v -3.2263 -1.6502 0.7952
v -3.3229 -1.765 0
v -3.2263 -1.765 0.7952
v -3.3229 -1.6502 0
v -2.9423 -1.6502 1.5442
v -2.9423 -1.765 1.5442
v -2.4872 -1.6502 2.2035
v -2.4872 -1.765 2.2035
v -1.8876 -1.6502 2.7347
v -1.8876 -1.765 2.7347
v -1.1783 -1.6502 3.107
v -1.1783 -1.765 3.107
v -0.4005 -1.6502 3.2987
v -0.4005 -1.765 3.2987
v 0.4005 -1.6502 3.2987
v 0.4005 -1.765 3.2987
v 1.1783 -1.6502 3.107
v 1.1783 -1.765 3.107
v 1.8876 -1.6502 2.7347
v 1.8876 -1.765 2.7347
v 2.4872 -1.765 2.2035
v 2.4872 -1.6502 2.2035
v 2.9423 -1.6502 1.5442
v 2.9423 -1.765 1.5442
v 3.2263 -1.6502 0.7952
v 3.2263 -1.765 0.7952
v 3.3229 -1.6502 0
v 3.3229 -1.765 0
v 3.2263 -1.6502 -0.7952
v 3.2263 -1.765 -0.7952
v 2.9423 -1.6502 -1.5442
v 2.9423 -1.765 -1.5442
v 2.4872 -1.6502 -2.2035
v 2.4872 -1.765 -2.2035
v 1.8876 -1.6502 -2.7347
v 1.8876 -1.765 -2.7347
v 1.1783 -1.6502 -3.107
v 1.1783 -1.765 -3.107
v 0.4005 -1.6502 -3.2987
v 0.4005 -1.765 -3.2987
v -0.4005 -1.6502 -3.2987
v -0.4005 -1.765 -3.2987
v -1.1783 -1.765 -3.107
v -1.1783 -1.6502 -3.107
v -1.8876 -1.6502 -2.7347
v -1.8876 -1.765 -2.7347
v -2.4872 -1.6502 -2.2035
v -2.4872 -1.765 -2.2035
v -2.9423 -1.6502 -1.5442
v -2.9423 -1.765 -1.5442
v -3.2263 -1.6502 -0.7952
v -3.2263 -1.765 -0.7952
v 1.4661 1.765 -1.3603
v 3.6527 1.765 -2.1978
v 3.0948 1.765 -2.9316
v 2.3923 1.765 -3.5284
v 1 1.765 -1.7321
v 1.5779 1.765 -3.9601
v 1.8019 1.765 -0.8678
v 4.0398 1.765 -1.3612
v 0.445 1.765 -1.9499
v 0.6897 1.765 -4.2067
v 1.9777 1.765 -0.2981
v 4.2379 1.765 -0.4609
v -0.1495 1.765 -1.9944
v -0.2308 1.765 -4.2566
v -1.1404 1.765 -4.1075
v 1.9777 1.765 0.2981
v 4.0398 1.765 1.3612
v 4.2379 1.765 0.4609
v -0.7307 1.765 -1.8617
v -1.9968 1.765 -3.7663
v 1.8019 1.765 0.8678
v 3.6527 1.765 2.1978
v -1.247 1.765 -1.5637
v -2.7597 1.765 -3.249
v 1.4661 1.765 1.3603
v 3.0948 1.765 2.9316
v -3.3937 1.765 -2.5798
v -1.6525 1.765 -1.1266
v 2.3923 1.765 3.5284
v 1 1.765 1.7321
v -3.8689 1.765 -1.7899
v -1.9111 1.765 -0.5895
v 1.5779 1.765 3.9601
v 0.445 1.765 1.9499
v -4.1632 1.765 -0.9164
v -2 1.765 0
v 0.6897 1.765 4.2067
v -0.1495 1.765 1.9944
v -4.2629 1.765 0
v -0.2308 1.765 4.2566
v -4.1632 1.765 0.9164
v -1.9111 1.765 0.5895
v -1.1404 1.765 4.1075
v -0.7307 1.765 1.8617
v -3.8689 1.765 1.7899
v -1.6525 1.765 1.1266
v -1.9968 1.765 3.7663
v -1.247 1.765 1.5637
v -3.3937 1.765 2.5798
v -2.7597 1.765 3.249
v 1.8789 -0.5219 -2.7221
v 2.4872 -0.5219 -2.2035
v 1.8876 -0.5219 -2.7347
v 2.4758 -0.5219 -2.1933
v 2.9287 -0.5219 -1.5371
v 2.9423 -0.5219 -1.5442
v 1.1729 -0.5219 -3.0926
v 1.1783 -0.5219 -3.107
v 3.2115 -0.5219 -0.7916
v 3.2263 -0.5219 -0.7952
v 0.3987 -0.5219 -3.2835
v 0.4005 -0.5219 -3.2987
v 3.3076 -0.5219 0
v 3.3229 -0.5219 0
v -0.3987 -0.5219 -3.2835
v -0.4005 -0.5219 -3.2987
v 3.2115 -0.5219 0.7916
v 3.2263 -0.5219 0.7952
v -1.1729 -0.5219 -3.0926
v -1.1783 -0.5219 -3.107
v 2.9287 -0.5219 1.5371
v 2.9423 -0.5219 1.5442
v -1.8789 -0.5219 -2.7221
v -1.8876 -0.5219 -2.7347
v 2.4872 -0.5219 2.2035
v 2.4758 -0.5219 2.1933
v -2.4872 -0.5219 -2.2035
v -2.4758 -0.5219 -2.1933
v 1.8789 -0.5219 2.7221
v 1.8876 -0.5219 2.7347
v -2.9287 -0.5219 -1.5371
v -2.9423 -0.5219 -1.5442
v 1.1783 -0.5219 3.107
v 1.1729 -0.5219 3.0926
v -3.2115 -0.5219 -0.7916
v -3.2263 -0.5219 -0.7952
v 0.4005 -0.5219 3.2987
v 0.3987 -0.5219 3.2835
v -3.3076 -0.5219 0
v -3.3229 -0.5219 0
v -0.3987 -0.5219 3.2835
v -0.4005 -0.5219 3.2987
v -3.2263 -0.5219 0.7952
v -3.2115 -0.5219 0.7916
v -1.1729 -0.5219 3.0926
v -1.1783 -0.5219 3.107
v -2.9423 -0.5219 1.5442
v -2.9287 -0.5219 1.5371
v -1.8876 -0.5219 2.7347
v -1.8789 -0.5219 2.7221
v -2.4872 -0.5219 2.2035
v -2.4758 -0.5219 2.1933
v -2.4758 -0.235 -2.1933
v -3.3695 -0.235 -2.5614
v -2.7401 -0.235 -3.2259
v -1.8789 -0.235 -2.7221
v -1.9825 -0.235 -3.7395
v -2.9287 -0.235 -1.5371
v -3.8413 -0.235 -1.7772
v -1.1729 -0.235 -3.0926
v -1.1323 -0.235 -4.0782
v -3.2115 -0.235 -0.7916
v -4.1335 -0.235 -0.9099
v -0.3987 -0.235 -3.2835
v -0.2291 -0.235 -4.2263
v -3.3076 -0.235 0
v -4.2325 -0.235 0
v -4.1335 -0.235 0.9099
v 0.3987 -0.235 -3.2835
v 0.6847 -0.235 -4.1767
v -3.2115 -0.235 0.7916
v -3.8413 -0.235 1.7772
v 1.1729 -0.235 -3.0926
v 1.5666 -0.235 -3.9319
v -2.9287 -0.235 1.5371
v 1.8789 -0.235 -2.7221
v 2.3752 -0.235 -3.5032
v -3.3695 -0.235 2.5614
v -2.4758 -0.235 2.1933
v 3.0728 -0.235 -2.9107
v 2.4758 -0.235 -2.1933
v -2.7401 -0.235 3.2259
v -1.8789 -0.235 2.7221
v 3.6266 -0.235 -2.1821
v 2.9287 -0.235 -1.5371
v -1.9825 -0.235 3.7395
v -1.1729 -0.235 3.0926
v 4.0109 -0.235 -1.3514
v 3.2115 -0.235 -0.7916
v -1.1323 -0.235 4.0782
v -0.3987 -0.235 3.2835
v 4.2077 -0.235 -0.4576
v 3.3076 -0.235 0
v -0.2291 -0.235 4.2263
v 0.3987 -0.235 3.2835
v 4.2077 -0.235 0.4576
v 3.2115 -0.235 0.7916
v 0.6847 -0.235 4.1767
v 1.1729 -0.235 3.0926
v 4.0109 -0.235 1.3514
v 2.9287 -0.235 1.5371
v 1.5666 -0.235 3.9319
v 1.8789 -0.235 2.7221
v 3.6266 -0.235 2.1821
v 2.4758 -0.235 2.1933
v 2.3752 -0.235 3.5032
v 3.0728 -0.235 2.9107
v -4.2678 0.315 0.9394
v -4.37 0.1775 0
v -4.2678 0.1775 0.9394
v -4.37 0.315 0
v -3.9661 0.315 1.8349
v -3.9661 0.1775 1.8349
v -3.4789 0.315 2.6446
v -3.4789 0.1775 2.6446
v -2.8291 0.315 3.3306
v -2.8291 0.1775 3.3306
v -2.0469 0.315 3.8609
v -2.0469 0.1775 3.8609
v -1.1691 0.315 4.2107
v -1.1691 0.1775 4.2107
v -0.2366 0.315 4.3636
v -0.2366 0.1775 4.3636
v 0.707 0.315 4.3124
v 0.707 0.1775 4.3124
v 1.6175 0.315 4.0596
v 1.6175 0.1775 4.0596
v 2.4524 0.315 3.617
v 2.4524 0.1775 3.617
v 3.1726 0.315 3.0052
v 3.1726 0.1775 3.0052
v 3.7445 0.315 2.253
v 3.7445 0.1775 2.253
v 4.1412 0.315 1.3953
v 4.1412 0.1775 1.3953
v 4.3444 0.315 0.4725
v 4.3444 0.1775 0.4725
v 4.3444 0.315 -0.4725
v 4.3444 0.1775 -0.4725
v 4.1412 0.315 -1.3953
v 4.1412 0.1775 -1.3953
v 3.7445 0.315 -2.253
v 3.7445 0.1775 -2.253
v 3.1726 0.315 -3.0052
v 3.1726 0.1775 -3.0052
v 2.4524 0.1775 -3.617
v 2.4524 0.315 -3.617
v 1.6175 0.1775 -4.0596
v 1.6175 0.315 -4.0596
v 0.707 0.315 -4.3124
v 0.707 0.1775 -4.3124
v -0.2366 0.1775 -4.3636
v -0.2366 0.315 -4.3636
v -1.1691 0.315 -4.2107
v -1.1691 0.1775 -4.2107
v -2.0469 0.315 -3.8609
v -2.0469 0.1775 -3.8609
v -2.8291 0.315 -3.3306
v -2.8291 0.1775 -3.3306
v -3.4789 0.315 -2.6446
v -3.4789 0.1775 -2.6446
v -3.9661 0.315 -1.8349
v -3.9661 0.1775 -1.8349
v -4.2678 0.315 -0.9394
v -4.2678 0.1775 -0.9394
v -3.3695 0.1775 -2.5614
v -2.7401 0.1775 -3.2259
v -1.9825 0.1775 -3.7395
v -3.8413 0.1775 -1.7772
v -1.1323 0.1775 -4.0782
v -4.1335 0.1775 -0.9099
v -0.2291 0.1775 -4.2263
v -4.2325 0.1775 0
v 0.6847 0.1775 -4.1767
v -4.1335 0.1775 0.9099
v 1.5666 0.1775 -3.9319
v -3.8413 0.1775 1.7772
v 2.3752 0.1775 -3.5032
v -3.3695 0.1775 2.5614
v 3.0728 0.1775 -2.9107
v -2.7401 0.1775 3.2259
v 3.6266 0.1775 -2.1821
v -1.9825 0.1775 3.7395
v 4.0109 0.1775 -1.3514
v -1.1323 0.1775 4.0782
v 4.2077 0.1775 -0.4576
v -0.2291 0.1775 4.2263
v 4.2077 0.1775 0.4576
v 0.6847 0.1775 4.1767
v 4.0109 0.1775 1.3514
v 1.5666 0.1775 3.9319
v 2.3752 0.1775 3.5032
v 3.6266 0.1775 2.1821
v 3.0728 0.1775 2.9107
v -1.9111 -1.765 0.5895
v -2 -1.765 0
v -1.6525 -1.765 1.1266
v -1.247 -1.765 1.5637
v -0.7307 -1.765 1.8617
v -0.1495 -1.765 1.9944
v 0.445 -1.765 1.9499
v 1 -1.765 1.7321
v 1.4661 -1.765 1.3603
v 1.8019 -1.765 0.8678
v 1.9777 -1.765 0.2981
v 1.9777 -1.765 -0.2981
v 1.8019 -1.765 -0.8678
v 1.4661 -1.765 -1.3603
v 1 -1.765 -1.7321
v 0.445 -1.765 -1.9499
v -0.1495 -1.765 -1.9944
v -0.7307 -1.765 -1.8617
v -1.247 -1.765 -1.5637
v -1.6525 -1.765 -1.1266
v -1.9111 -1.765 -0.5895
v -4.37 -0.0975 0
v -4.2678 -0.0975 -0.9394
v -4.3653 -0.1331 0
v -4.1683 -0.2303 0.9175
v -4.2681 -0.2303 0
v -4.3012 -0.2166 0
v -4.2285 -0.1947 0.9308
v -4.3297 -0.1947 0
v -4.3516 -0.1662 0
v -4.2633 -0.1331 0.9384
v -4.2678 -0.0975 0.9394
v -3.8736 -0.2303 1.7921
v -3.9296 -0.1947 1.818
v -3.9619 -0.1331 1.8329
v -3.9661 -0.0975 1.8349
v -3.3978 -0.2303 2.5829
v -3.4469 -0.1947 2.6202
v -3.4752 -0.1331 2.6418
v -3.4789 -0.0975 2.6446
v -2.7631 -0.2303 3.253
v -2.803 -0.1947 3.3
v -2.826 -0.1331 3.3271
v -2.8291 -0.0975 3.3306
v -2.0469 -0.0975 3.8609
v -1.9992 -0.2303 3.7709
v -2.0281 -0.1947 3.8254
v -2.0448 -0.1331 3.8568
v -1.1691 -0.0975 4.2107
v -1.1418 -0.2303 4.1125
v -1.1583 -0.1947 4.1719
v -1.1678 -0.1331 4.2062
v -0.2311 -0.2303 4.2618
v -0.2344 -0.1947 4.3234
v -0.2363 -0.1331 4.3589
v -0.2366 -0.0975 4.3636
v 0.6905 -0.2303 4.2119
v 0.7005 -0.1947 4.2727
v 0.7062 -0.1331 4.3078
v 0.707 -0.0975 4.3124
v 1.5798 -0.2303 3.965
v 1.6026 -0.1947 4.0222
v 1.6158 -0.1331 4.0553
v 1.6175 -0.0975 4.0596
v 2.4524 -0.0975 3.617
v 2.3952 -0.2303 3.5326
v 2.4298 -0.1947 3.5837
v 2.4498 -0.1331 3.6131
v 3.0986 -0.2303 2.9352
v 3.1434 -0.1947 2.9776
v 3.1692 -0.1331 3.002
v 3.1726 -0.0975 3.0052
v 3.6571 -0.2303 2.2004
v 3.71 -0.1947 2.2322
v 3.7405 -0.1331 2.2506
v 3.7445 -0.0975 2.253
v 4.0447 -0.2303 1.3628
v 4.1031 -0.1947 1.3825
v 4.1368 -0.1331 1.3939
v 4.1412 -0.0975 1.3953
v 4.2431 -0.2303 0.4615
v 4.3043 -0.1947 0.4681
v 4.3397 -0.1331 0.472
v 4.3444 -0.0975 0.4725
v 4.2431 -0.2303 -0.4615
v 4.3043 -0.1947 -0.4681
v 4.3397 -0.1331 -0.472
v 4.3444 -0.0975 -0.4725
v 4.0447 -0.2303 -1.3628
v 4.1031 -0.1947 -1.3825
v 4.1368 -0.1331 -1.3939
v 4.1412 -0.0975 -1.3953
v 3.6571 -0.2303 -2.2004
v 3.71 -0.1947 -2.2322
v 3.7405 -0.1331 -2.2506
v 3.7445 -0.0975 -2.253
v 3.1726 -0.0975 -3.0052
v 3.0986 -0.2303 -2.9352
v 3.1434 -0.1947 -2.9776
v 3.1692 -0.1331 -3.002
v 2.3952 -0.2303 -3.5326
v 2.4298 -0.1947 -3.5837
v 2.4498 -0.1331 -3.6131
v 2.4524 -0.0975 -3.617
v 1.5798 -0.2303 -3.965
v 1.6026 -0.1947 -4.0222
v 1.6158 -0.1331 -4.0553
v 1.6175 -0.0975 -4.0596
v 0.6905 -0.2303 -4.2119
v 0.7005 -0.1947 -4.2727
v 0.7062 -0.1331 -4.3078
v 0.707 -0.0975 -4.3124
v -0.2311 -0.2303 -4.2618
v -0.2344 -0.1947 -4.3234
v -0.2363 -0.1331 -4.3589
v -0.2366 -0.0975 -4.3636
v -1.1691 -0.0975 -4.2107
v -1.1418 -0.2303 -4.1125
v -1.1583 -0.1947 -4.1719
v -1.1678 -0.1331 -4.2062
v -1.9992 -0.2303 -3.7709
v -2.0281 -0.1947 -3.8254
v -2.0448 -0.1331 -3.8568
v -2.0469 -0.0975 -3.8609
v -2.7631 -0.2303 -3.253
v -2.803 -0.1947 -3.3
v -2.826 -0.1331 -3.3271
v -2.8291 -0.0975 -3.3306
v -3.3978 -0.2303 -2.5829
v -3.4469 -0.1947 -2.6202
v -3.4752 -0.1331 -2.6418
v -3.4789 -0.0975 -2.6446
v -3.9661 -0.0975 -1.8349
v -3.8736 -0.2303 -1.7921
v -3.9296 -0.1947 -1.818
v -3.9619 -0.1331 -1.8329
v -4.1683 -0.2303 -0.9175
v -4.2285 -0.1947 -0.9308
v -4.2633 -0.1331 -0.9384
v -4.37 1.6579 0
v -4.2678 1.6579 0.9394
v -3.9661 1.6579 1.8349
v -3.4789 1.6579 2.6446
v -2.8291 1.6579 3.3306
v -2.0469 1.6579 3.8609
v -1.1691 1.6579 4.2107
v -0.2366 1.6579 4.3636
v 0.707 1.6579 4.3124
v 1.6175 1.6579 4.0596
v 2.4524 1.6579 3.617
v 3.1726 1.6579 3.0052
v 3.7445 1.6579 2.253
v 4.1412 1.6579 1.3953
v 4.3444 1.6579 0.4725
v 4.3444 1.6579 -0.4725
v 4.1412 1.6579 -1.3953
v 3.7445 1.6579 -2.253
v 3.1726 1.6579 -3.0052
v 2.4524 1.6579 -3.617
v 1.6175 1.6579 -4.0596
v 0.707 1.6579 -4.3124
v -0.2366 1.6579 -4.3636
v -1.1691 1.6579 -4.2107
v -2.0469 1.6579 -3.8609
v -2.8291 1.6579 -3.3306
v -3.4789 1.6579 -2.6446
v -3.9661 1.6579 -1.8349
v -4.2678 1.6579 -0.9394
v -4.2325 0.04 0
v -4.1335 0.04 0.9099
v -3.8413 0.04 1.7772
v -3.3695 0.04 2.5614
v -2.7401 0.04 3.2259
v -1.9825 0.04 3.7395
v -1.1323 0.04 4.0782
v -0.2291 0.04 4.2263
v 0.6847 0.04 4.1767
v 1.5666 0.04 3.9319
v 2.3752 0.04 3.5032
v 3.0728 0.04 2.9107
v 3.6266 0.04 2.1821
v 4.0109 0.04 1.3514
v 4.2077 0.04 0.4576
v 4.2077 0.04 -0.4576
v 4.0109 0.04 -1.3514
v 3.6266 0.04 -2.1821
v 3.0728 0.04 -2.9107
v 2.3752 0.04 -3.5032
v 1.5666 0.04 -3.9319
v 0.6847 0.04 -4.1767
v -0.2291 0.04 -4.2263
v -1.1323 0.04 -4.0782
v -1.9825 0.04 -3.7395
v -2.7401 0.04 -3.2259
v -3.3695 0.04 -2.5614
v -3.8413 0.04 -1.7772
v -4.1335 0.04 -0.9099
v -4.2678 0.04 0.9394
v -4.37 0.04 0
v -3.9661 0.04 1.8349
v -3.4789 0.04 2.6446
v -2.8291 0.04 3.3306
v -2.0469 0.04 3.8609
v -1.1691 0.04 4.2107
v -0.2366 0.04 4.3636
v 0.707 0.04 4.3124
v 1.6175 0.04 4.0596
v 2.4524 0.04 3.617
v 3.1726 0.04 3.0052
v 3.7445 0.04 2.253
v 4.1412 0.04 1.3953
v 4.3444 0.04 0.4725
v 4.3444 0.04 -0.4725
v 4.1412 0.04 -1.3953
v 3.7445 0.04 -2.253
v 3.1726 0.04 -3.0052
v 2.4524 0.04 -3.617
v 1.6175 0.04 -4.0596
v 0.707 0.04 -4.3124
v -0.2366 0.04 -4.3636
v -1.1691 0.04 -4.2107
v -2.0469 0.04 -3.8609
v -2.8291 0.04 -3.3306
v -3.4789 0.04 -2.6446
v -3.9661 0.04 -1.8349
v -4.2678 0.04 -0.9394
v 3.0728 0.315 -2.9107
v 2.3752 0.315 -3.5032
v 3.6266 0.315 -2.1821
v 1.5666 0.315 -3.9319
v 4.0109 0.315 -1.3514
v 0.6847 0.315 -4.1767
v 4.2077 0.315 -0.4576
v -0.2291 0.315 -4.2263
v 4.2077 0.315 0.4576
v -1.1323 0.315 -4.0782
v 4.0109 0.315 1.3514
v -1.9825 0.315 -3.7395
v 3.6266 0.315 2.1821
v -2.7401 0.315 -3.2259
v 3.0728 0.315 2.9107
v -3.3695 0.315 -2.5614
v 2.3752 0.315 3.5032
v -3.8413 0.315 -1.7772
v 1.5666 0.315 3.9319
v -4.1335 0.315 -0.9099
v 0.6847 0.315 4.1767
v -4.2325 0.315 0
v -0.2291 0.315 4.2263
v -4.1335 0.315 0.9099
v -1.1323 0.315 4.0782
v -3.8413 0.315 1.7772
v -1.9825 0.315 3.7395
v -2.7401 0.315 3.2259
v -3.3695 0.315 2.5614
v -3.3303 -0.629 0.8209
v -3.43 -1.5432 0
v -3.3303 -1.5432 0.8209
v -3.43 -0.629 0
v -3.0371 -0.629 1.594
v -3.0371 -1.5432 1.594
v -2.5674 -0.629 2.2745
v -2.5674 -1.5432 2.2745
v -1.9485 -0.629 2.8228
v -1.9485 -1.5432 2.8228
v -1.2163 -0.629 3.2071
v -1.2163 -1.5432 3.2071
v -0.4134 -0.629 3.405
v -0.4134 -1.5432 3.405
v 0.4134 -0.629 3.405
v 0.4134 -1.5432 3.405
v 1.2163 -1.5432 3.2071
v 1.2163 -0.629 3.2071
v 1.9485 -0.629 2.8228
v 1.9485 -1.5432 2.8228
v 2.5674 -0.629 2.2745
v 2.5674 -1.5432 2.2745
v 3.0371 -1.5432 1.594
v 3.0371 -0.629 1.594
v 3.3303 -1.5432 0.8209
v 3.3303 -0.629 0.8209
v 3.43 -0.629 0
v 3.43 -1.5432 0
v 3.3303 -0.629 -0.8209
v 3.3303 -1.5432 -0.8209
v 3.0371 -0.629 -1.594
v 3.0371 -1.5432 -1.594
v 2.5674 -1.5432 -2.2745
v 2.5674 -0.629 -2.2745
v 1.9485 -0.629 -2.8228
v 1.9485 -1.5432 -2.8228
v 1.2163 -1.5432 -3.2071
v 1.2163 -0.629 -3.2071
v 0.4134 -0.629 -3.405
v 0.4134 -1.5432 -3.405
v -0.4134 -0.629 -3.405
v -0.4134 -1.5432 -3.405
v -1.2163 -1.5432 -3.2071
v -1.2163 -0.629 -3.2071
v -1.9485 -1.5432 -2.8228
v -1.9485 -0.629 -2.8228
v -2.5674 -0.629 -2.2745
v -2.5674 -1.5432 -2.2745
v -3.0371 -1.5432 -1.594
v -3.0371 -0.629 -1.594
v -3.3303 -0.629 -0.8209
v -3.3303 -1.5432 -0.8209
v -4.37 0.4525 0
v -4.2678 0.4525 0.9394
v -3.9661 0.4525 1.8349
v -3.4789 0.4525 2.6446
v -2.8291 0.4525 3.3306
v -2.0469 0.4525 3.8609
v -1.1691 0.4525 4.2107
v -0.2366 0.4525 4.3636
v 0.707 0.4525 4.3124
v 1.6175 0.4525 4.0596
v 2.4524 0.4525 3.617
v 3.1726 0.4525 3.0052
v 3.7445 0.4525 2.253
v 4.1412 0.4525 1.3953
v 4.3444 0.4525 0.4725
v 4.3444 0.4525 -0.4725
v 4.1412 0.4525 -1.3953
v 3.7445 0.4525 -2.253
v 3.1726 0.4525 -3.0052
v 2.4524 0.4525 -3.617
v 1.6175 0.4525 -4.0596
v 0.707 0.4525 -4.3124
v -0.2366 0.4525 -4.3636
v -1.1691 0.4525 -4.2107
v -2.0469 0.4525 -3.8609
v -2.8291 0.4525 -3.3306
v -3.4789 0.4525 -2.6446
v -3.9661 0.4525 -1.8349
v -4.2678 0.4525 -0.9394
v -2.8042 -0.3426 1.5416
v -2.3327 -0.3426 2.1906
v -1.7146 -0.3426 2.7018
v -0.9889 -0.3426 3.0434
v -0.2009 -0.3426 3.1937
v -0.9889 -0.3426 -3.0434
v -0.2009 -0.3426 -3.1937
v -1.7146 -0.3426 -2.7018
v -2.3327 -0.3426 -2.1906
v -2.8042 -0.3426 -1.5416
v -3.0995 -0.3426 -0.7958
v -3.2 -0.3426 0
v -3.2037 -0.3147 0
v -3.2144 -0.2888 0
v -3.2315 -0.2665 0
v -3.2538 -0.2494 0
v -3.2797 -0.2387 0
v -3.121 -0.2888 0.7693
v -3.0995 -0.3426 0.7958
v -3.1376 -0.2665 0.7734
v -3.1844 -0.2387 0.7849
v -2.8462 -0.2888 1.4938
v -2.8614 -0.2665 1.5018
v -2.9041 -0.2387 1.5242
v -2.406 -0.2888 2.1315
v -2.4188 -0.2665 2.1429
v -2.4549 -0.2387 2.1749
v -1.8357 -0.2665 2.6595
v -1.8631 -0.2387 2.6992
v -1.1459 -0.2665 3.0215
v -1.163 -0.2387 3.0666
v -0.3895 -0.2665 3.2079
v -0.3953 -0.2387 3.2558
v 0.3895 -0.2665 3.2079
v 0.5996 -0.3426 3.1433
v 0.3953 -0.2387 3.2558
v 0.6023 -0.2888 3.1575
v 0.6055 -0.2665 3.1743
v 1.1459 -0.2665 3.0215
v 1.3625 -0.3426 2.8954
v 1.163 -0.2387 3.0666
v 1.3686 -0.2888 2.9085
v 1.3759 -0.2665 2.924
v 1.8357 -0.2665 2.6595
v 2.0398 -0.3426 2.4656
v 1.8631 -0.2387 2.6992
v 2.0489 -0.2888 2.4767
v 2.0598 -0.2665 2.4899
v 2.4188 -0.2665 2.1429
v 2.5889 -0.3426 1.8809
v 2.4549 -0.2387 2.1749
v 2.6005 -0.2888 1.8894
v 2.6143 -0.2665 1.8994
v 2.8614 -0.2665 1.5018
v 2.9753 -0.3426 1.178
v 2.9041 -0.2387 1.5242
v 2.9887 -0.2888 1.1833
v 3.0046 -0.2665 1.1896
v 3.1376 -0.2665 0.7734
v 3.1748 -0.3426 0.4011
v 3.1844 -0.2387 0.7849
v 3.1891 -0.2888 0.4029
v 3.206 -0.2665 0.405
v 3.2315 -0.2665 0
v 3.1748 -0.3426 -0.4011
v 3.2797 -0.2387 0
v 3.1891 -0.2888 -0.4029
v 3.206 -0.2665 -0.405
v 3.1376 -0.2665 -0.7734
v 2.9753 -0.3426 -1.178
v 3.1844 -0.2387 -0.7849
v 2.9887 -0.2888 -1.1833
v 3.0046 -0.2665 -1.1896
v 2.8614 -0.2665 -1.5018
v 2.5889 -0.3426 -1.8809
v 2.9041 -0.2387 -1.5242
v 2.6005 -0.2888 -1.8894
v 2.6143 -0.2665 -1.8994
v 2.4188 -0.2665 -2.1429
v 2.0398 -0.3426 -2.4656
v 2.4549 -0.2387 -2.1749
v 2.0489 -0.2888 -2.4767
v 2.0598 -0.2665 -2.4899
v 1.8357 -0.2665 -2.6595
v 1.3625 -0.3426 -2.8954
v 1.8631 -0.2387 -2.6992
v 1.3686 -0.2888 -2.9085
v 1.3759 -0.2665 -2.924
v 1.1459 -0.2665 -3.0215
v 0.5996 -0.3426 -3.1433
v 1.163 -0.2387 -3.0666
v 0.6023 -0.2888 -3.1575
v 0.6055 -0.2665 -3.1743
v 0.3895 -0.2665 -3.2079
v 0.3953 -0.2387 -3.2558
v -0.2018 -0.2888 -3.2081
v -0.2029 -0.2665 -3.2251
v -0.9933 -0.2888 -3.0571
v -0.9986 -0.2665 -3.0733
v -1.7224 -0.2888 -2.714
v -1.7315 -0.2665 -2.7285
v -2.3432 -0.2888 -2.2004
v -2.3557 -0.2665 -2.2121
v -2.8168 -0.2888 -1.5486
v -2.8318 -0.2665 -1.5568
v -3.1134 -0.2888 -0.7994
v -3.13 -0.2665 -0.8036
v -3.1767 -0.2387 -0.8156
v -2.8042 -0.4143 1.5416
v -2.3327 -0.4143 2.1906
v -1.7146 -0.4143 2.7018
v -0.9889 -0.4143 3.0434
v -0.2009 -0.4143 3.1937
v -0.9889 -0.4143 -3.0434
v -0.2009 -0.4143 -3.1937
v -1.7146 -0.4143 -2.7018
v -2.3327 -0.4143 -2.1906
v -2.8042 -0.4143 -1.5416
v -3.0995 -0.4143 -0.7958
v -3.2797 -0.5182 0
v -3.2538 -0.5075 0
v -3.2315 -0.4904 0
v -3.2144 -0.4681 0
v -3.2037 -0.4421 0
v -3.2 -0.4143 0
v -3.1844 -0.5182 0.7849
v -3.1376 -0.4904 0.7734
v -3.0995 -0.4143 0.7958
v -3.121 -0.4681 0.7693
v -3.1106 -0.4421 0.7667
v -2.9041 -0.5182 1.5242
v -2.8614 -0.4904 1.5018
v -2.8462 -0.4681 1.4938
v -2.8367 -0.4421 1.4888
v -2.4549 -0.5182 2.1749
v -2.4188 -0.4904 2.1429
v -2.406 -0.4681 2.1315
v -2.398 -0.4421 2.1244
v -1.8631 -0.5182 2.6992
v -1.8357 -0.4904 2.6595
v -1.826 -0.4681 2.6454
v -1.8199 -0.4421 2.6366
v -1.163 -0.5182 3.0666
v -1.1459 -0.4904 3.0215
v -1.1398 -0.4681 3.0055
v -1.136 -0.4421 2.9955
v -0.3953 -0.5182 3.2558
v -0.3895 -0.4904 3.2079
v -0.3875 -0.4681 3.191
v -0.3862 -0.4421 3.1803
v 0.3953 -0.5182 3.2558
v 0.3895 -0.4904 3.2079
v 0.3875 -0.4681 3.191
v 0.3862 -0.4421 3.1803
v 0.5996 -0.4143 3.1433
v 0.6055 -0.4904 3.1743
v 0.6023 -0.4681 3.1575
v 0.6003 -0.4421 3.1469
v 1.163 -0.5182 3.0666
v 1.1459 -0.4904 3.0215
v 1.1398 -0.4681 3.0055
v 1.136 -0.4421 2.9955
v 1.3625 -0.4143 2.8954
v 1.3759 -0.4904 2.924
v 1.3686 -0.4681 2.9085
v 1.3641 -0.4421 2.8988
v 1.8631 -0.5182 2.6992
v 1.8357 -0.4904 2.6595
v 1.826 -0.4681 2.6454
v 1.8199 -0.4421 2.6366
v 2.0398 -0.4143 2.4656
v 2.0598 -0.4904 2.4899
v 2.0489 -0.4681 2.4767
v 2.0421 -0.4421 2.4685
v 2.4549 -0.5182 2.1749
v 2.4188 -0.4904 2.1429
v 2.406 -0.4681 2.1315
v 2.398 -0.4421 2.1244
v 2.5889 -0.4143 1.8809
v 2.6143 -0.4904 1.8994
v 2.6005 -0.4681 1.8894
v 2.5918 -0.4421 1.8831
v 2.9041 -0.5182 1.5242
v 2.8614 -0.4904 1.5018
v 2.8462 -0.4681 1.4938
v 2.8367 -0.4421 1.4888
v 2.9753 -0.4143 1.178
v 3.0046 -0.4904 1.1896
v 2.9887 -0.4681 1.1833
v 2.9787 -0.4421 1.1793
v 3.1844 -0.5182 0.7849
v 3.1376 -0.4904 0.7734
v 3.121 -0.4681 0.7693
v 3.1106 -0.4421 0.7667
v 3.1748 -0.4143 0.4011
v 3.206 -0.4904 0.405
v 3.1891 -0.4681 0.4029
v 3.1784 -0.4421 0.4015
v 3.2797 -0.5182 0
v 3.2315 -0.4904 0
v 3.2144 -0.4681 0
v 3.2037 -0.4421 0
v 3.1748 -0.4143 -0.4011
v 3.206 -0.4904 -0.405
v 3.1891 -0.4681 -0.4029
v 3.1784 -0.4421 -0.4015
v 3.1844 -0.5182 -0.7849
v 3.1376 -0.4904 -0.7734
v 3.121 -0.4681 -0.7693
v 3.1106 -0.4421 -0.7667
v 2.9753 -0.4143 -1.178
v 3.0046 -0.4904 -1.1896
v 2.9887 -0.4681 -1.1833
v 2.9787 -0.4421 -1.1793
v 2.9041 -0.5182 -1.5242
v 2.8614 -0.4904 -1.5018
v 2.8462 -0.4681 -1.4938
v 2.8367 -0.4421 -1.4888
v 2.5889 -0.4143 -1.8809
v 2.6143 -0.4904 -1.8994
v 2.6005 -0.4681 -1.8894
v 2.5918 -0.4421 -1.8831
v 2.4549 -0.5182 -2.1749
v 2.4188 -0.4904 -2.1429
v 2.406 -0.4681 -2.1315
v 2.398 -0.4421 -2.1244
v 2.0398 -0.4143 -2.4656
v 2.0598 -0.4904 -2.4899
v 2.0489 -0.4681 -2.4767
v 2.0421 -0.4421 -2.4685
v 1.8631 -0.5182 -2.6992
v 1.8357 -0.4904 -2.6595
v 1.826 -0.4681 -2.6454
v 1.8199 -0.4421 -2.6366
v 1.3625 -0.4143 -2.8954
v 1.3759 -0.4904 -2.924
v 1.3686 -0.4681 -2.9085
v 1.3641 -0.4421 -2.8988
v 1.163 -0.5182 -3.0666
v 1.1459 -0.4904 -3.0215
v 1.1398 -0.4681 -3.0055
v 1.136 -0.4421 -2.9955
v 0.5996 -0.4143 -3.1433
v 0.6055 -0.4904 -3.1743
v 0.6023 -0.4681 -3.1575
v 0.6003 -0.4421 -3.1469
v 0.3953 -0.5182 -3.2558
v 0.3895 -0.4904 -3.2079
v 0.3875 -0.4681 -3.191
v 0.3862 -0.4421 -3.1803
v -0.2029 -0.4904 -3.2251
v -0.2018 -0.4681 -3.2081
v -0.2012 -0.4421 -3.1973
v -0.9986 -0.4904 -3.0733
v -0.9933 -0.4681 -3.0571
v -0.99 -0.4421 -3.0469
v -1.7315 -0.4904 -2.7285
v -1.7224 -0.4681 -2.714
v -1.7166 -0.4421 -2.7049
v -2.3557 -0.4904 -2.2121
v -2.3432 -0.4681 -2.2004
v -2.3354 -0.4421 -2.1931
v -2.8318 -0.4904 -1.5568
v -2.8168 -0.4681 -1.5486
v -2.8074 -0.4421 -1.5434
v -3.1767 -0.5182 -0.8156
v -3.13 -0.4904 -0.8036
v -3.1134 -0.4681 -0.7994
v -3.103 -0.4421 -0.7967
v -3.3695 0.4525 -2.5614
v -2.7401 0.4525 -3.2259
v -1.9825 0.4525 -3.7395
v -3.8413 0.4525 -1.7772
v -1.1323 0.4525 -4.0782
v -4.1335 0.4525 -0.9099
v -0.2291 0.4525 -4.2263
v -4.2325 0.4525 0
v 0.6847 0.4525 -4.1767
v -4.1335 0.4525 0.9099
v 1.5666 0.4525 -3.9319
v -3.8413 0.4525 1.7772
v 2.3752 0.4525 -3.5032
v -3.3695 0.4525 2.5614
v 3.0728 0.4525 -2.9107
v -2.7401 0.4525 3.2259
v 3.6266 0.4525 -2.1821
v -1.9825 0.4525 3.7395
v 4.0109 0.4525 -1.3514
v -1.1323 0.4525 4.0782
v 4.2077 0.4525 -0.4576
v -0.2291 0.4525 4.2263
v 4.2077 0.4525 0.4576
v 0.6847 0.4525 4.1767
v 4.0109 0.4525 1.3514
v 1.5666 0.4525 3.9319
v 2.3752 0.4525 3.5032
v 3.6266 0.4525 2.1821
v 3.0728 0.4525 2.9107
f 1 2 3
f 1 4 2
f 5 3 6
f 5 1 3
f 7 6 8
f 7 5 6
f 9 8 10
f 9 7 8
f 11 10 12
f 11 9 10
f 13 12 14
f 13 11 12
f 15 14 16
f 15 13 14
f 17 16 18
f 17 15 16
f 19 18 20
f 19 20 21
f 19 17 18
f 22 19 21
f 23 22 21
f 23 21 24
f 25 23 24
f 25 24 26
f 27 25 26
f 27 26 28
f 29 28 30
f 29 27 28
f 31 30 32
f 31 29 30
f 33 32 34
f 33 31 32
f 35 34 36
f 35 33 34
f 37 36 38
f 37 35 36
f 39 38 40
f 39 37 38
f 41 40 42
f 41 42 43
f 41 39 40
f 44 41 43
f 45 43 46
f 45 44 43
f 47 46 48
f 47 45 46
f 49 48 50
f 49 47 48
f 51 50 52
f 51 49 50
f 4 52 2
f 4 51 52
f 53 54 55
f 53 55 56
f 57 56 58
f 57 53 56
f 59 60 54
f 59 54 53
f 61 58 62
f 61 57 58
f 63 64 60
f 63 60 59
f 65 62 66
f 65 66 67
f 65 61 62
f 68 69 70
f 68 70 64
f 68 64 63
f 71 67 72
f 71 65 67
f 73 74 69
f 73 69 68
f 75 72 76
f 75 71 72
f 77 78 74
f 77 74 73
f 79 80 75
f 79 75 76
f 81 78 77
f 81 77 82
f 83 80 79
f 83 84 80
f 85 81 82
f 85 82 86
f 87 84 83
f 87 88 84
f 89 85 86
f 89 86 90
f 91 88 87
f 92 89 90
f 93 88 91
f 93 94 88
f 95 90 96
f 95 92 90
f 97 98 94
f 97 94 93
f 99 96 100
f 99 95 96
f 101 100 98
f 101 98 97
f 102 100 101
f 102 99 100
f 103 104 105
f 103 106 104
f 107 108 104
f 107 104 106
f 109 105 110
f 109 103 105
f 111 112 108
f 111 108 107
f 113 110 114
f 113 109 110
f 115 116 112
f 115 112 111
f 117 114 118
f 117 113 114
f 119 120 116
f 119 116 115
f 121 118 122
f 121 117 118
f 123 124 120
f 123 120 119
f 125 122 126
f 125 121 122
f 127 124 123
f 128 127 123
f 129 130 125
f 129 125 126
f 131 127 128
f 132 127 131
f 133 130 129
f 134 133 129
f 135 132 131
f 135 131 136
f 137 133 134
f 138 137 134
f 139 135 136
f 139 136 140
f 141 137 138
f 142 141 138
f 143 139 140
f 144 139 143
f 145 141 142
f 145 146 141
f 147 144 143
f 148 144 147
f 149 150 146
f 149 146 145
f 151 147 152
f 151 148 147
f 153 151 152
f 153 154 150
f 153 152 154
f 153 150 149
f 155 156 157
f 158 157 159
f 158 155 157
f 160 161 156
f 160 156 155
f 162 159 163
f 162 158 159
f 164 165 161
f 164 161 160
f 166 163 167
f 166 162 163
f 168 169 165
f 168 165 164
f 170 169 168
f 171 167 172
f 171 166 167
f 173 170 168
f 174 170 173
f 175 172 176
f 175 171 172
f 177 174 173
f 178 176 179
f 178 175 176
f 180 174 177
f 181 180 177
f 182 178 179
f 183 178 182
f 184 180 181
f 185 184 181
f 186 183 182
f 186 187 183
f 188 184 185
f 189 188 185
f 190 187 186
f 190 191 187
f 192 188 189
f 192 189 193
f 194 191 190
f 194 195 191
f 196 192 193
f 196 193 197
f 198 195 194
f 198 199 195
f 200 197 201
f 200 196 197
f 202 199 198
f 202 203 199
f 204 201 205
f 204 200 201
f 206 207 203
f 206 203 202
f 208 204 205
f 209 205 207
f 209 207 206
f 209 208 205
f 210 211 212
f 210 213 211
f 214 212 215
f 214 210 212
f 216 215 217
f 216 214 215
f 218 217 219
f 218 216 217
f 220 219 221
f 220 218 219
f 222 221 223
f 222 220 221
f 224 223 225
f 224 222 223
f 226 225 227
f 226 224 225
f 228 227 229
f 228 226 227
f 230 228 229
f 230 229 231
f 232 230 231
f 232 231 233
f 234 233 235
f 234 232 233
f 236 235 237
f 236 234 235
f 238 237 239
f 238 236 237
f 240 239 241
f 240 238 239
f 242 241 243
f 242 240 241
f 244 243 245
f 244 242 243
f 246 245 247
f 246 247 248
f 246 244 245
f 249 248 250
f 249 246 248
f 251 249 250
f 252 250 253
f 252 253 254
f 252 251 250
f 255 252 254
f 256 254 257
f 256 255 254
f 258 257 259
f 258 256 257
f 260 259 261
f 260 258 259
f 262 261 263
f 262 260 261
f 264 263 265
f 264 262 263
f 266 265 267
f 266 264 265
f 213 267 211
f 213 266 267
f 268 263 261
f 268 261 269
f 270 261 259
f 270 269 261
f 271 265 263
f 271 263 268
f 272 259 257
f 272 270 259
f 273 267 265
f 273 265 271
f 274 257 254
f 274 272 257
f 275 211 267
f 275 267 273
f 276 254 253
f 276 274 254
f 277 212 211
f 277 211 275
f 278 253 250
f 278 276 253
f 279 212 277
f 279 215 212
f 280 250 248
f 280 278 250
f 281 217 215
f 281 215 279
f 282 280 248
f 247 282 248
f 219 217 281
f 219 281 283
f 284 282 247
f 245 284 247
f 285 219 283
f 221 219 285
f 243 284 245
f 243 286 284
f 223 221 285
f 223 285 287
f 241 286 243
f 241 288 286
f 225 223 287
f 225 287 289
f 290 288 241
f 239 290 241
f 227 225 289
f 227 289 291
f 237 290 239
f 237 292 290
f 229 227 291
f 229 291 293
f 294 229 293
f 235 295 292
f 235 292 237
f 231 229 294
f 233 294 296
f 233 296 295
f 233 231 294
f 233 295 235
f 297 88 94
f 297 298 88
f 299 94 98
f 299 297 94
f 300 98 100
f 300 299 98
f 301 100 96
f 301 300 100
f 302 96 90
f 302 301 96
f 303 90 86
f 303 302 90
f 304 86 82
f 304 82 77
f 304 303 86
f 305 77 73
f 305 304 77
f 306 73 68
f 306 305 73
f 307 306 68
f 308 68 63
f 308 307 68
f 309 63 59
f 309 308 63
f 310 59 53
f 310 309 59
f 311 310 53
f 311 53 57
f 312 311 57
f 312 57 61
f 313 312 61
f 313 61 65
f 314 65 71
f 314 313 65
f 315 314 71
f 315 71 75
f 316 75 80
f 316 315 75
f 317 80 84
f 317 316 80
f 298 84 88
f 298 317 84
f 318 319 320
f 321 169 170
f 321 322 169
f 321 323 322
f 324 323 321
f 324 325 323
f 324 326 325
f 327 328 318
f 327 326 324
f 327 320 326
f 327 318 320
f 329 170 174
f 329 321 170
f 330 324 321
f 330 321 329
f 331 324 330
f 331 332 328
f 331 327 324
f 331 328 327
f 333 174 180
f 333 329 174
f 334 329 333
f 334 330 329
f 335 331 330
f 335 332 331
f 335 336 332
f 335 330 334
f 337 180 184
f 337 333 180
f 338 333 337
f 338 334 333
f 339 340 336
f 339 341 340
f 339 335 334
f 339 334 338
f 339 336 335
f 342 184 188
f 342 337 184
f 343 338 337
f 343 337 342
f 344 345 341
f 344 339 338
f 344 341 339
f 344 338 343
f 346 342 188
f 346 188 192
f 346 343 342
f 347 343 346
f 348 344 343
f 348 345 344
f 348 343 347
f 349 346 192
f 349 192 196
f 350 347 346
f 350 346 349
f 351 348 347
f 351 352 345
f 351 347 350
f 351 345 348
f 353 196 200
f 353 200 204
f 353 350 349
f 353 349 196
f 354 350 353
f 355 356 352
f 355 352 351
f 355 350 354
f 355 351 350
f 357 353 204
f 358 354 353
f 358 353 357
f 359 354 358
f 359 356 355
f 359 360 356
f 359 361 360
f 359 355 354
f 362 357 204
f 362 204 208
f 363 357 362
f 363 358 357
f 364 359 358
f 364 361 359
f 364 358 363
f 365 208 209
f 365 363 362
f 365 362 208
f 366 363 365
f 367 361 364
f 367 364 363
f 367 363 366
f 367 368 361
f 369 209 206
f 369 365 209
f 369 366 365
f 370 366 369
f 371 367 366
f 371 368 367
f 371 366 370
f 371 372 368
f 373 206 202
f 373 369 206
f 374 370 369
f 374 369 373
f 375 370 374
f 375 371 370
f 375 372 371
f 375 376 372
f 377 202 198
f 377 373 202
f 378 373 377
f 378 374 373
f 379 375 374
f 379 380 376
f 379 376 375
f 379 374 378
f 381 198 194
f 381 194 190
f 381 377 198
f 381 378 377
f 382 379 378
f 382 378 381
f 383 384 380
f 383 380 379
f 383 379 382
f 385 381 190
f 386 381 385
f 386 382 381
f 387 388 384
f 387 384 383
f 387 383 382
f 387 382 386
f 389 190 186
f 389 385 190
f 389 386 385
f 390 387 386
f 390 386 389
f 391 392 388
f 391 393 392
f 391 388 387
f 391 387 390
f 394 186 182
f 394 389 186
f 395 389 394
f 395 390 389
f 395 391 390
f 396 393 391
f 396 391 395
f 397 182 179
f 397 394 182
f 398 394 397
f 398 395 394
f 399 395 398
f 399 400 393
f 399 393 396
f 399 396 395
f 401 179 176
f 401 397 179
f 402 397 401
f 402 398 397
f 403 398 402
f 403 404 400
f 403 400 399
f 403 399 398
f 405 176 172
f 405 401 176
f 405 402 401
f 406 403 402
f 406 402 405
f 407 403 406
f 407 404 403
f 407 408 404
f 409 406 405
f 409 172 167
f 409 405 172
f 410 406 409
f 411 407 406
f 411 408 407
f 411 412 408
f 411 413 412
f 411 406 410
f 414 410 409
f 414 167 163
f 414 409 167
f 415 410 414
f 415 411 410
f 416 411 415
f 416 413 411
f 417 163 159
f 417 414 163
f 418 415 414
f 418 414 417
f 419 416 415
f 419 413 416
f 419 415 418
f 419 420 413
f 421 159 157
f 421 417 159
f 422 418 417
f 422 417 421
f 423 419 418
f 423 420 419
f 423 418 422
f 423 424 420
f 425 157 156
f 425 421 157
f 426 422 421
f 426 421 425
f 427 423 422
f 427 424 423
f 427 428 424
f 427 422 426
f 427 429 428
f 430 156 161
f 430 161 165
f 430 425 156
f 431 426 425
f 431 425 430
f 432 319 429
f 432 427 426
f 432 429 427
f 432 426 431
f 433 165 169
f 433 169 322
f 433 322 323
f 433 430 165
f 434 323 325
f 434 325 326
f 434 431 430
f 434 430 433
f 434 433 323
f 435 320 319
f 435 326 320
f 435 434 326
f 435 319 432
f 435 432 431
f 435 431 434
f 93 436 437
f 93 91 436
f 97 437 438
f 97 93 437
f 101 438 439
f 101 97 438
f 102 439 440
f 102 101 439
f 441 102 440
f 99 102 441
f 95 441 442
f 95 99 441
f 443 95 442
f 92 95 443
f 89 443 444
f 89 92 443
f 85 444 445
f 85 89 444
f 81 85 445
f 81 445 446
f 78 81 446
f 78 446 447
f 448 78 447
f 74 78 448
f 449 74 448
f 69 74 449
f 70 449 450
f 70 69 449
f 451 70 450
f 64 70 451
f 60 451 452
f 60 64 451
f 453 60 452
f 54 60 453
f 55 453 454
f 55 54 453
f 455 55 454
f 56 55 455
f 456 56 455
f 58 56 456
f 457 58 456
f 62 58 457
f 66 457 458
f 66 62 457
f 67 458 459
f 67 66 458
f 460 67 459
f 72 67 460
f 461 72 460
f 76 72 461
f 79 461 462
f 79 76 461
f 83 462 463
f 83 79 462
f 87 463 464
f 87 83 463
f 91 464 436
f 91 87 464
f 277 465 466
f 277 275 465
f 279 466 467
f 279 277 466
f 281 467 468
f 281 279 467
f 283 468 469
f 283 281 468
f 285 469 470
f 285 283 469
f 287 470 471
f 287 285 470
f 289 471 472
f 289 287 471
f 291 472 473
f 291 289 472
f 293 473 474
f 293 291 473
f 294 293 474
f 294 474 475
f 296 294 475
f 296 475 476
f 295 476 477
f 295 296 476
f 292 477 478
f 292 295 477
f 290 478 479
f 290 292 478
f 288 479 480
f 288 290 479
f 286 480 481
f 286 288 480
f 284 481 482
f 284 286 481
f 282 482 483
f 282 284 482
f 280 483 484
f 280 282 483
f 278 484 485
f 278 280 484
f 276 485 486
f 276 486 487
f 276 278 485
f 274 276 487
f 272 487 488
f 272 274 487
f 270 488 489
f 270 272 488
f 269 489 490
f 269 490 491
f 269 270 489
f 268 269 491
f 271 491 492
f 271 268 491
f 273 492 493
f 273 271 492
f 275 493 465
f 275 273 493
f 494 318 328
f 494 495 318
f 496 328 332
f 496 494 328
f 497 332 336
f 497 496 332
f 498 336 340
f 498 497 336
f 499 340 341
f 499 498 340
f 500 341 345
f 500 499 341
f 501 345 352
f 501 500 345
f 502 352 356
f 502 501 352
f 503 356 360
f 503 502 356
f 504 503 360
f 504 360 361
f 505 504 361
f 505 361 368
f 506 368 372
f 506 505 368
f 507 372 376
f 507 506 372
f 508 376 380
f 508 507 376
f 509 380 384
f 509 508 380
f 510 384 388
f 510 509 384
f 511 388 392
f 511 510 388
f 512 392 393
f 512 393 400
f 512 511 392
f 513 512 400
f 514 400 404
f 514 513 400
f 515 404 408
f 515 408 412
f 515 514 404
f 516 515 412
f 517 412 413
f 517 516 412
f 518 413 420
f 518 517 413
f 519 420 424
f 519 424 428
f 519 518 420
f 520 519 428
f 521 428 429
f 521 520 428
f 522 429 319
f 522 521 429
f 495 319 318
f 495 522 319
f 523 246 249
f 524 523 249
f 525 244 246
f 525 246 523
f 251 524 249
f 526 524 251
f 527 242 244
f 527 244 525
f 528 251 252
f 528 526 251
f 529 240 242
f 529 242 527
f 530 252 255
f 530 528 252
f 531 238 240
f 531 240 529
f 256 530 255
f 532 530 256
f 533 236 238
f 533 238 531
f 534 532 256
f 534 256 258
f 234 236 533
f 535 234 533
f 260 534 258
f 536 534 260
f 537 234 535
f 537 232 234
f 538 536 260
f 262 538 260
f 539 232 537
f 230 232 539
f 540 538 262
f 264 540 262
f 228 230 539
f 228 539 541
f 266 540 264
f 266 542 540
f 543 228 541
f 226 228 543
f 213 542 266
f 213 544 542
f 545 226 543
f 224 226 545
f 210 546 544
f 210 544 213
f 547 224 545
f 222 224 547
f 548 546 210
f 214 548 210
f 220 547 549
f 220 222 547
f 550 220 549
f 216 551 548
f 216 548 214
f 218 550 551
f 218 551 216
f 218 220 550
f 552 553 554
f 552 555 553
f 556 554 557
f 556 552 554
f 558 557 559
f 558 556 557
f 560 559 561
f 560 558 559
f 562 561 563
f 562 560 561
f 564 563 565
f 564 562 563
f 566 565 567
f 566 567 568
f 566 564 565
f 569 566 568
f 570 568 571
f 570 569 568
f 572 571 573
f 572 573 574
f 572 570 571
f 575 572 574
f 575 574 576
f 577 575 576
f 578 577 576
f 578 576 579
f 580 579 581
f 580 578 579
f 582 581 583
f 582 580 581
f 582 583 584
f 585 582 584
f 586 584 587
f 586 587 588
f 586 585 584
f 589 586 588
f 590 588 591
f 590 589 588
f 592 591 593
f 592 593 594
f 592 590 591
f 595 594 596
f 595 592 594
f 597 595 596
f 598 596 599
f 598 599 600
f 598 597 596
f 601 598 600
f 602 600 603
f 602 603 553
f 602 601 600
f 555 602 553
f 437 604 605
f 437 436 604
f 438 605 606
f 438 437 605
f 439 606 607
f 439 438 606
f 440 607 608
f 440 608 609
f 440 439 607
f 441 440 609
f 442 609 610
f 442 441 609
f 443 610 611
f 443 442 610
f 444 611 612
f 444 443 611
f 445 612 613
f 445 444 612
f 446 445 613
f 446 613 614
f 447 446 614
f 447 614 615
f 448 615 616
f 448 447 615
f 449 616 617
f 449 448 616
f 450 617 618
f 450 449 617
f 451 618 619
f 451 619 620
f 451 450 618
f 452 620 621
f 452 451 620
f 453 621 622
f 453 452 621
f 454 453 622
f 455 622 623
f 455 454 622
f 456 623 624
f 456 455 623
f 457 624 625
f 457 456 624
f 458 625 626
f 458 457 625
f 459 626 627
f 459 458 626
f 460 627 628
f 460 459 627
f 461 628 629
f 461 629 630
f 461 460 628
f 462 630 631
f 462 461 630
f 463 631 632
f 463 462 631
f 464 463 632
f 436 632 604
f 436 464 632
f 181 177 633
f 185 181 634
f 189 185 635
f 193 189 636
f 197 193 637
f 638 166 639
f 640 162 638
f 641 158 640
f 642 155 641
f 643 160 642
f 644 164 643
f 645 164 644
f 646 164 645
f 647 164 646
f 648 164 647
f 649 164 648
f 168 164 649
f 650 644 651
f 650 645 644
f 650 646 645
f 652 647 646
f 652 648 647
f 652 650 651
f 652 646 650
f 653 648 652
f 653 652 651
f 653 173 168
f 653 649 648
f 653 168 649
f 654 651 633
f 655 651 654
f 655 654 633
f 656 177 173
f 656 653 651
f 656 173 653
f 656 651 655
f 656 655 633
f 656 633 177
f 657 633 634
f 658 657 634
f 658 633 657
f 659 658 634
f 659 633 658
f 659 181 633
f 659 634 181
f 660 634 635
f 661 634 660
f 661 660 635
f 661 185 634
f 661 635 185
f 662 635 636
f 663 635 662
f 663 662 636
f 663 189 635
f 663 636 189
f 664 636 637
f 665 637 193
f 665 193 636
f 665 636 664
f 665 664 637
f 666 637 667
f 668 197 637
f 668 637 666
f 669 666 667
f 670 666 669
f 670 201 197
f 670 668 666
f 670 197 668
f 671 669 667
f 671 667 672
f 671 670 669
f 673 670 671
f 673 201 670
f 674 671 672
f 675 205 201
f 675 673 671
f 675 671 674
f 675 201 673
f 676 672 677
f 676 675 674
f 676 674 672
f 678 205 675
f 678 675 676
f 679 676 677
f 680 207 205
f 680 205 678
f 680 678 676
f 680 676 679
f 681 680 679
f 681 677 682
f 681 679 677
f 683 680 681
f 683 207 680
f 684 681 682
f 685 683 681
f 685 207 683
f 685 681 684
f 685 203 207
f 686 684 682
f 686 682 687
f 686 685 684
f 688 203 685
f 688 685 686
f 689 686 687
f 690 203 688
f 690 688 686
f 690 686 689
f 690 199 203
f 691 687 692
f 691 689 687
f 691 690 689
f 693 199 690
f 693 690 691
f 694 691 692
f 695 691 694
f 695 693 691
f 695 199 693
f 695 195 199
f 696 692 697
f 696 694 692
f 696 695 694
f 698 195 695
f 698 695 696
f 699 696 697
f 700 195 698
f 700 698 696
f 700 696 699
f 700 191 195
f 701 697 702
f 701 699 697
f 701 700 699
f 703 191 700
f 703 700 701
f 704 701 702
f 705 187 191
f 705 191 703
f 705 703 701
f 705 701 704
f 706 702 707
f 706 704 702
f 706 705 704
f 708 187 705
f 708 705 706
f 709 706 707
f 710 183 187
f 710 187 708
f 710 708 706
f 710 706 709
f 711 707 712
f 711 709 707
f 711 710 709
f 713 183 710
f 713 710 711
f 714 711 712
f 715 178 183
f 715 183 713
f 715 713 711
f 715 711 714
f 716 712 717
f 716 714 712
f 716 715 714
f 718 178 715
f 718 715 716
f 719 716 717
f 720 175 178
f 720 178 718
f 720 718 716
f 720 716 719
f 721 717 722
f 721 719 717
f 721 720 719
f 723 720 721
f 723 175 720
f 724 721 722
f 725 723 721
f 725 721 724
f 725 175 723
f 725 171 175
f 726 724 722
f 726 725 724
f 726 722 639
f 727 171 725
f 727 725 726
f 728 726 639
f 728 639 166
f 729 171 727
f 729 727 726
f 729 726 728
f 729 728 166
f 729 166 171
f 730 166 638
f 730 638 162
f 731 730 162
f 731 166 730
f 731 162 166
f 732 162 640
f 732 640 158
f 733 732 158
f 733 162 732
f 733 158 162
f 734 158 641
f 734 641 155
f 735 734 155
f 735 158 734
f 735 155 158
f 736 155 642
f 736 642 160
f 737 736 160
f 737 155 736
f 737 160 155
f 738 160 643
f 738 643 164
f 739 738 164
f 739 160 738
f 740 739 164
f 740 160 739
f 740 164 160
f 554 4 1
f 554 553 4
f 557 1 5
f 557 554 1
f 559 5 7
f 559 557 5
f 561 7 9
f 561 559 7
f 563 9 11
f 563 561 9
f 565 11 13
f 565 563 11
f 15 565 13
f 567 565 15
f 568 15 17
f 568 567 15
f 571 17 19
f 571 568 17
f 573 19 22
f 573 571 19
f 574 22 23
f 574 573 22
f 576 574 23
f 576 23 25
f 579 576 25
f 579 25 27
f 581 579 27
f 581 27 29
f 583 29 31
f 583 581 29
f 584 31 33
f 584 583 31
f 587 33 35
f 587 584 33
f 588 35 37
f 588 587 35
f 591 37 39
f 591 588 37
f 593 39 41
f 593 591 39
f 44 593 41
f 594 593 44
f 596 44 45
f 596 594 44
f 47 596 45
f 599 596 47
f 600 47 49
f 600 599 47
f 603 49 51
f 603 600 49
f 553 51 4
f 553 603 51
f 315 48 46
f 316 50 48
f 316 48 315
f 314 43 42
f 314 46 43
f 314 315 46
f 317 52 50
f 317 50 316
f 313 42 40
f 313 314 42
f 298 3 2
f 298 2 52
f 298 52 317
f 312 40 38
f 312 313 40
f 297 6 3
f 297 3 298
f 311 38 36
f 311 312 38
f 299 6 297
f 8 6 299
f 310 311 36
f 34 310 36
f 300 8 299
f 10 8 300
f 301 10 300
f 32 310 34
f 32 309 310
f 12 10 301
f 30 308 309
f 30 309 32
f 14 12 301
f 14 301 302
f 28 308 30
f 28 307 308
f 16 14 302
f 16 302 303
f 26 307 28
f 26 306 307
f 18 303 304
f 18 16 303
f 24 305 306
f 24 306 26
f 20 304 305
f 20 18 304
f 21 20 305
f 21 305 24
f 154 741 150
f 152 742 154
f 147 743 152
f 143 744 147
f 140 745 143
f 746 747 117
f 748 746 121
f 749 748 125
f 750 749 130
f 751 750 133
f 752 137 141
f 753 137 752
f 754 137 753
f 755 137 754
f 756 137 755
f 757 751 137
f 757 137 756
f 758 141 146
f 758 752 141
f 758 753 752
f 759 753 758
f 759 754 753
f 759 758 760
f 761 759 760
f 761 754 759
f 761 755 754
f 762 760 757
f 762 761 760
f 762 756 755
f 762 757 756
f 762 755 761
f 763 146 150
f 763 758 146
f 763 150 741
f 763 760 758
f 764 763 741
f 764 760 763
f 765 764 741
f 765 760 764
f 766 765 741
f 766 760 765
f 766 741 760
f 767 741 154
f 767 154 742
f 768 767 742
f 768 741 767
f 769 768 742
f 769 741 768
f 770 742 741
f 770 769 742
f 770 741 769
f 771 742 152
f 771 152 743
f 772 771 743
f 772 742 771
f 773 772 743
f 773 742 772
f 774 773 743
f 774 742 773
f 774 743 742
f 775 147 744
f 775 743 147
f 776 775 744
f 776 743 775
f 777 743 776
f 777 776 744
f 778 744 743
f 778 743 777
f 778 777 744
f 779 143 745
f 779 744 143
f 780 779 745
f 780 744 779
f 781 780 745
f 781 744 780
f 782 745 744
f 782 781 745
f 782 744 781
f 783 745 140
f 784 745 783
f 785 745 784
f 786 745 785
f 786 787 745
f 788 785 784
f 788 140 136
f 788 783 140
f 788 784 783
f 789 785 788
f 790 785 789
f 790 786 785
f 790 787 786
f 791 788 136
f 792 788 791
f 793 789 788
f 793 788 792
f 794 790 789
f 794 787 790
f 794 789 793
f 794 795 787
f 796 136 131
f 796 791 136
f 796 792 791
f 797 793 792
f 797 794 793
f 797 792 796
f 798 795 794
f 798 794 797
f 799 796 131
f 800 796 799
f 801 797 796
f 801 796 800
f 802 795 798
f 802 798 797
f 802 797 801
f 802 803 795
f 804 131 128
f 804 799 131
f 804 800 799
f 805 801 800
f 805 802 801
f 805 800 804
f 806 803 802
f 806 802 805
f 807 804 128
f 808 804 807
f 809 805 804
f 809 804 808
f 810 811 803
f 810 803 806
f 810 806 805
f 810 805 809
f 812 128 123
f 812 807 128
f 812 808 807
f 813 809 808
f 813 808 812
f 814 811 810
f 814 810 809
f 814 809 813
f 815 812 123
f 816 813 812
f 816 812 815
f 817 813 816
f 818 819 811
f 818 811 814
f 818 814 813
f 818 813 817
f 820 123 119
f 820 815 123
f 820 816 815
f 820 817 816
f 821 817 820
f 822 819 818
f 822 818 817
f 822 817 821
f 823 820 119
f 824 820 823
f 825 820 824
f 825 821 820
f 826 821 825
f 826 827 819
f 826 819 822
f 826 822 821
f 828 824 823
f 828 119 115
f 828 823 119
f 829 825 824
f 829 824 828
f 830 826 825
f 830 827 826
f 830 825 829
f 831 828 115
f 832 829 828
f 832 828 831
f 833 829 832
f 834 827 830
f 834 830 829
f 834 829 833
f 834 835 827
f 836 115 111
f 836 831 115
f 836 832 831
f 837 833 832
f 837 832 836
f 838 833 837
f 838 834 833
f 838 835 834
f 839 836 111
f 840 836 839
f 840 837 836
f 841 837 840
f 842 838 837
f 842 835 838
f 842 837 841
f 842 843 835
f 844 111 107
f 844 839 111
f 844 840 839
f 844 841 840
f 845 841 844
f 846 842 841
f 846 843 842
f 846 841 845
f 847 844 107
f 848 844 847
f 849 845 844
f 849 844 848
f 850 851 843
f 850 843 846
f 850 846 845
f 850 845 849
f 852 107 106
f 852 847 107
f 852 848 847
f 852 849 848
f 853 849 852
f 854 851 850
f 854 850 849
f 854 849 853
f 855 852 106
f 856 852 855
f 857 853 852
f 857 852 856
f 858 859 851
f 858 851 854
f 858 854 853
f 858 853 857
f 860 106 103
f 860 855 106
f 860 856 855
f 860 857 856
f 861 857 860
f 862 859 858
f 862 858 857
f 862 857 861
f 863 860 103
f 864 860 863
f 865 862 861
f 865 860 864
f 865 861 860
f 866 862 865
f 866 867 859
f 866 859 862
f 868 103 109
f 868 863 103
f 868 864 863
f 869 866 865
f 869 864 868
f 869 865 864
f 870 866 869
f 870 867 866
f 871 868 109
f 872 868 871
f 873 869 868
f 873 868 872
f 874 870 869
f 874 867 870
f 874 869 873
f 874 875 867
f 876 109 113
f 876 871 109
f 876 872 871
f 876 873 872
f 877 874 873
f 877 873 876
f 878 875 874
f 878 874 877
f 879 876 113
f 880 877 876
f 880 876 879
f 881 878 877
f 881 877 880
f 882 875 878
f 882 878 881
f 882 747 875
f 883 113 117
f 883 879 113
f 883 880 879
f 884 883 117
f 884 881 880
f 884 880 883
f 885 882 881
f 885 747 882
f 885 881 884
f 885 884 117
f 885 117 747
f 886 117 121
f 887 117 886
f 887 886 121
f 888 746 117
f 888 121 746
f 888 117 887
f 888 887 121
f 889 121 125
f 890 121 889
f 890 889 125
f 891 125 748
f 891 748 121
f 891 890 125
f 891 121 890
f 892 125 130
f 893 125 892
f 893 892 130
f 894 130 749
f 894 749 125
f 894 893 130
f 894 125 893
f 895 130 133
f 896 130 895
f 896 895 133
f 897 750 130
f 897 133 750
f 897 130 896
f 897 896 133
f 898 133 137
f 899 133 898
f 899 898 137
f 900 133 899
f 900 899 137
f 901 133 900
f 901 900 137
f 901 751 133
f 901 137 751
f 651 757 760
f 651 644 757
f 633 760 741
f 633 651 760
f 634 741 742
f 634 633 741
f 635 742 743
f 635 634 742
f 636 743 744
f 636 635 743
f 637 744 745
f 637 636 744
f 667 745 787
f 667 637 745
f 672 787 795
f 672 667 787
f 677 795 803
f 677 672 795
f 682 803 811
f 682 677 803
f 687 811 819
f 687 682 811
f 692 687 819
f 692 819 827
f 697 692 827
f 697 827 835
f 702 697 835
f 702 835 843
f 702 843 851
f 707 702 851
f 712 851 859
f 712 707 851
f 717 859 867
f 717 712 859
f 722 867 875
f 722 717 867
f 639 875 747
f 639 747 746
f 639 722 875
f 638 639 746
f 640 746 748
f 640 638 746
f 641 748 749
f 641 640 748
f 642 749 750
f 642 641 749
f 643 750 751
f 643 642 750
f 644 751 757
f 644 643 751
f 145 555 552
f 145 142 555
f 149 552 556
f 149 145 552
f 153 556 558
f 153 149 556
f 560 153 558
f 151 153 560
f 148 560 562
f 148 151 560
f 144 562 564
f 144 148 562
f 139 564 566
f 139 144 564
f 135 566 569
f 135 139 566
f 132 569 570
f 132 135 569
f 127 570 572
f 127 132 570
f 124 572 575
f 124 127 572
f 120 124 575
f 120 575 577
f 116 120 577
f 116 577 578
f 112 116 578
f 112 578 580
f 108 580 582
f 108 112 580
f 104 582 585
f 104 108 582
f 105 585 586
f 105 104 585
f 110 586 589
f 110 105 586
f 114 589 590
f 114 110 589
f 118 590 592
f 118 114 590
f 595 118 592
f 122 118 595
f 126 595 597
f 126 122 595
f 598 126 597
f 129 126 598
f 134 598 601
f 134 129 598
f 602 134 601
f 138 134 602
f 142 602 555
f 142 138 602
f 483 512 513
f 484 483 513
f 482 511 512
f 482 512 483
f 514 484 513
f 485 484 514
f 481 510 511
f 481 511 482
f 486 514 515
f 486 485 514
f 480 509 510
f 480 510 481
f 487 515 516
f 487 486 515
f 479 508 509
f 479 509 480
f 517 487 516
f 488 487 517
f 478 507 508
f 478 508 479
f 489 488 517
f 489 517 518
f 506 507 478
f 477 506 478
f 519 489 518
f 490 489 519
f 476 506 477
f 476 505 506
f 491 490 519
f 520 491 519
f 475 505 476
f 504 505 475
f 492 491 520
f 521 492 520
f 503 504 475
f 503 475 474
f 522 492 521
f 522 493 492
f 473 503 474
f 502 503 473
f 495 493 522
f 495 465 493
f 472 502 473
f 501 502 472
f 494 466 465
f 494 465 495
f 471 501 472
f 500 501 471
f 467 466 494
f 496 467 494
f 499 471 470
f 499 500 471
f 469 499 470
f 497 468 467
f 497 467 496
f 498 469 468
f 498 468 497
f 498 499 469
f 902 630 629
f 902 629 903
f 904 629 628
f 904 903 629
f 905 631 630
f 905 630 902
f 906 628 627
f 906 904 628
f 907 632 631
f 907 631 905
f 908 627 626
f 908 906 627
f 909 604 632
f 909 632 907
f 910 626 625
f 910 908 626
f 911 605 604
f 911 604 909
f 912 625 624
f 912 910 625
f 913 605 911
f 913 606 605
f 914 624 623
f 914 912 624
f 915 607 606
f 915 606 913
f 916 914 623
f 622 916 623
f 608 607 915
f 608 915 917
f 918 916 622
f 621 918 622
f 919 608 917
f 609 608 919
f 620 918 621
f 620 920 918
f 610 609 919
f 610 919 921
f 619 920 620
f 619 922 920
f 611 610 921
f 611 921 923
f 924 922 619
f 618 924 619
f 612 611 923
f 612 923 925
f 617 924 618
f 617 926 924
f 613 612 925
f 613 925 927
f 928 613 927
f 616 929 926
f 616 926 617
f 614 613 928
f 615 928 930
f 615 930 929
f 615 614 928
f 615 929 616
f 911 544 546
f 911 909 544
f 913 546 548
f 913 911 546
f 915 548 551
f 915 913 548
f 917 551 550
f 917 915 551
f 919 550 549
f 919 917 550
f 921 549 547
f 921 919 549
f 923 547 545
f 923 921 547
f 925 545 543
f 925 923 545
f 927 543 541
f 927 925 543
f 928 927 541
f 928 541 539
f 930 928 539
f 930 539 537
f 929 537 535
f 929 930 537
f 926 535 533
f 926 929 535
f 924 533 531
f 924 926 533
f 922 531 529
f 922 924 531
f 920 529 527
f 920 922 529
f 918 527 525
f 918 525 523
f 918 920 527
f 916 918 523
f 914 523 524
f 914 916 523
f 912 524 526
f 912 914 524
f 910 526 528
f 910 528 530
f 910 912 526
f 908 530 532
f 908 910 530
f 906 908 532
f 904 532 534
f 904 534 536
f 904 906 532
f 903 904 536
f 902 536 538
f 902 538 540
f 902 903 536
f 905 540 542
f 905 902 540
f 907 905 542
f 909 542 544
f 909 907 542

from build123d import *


with BuildPart() as part:
    # Sketch3 → Revolve1 (revolve)
    with BuildSketch(Plane.XY):
        with BuildLine():
            Line((-2, 1.765), (-2, -1.765))
            Line((-2, -1.765), (-3.3229, -1.765))
            Line((-3.3229, -1.765), (-3.3229, -1.65025))
            Line((-3.3229, -1.65025), (-3.43, -1.54315))
            Line((-3.43, -1.54315), (-3.43, -0.628975))
            Line((-3.43, -0.628975), (-3.3229, -0.521875))
            Line((-3.3229, -0.521875), (-3.307578125, -0.521875))
            ThreePointArc((-3.307578125, -0.521875), (-3.231508903, -0.490366097), (-3.2, -0.414296875))
            Line((-3.2, -0.414296875), (-3.2, -0.342578125))
            ThreePointArc((-3.2, -0.342578125), (-3.231508903, -0.266508903), (-3.307578125, -0.235))
            Line((-3.307578125, -0.235), (-4.2325, -0.235))
            ThreePointArc((-4.2325, -0.235), (-4.329727182, -0.194727182), (-4.37, -0.0975))
            Line((-4.37, -0.0975), (-4.37, 0.04))
            Line((-4.37, 0.04), (-4.2325, 0.04))
            Line((-4.2325, 0.04), (-4.2325, 0.1775))
            Line((-4.2325, 0.1775), (-4.37, 0.1775))
            Line((-4.37, 0.1775), (-4.37, 0.315))
            Line((-4.37, 0.315), (-4.2325, 0.315))
            Line((-4.2325, 0.315), (-4.2325, 0.4525))
            Line((-4.2325, 0.4525), (-4.37, 0.4525))
            Line((-4.37, 0.4525), (-4.37, 1.6579))
            Line((-4.37, 1.6579), (-4.2629, 1.765))
            Line((-4.2629, 1.765), (-2, 1.765))
        make_face()
    revolve(axis=Axis((0, -1.765, 0), (0, 1, 0)))


solid = part.part
